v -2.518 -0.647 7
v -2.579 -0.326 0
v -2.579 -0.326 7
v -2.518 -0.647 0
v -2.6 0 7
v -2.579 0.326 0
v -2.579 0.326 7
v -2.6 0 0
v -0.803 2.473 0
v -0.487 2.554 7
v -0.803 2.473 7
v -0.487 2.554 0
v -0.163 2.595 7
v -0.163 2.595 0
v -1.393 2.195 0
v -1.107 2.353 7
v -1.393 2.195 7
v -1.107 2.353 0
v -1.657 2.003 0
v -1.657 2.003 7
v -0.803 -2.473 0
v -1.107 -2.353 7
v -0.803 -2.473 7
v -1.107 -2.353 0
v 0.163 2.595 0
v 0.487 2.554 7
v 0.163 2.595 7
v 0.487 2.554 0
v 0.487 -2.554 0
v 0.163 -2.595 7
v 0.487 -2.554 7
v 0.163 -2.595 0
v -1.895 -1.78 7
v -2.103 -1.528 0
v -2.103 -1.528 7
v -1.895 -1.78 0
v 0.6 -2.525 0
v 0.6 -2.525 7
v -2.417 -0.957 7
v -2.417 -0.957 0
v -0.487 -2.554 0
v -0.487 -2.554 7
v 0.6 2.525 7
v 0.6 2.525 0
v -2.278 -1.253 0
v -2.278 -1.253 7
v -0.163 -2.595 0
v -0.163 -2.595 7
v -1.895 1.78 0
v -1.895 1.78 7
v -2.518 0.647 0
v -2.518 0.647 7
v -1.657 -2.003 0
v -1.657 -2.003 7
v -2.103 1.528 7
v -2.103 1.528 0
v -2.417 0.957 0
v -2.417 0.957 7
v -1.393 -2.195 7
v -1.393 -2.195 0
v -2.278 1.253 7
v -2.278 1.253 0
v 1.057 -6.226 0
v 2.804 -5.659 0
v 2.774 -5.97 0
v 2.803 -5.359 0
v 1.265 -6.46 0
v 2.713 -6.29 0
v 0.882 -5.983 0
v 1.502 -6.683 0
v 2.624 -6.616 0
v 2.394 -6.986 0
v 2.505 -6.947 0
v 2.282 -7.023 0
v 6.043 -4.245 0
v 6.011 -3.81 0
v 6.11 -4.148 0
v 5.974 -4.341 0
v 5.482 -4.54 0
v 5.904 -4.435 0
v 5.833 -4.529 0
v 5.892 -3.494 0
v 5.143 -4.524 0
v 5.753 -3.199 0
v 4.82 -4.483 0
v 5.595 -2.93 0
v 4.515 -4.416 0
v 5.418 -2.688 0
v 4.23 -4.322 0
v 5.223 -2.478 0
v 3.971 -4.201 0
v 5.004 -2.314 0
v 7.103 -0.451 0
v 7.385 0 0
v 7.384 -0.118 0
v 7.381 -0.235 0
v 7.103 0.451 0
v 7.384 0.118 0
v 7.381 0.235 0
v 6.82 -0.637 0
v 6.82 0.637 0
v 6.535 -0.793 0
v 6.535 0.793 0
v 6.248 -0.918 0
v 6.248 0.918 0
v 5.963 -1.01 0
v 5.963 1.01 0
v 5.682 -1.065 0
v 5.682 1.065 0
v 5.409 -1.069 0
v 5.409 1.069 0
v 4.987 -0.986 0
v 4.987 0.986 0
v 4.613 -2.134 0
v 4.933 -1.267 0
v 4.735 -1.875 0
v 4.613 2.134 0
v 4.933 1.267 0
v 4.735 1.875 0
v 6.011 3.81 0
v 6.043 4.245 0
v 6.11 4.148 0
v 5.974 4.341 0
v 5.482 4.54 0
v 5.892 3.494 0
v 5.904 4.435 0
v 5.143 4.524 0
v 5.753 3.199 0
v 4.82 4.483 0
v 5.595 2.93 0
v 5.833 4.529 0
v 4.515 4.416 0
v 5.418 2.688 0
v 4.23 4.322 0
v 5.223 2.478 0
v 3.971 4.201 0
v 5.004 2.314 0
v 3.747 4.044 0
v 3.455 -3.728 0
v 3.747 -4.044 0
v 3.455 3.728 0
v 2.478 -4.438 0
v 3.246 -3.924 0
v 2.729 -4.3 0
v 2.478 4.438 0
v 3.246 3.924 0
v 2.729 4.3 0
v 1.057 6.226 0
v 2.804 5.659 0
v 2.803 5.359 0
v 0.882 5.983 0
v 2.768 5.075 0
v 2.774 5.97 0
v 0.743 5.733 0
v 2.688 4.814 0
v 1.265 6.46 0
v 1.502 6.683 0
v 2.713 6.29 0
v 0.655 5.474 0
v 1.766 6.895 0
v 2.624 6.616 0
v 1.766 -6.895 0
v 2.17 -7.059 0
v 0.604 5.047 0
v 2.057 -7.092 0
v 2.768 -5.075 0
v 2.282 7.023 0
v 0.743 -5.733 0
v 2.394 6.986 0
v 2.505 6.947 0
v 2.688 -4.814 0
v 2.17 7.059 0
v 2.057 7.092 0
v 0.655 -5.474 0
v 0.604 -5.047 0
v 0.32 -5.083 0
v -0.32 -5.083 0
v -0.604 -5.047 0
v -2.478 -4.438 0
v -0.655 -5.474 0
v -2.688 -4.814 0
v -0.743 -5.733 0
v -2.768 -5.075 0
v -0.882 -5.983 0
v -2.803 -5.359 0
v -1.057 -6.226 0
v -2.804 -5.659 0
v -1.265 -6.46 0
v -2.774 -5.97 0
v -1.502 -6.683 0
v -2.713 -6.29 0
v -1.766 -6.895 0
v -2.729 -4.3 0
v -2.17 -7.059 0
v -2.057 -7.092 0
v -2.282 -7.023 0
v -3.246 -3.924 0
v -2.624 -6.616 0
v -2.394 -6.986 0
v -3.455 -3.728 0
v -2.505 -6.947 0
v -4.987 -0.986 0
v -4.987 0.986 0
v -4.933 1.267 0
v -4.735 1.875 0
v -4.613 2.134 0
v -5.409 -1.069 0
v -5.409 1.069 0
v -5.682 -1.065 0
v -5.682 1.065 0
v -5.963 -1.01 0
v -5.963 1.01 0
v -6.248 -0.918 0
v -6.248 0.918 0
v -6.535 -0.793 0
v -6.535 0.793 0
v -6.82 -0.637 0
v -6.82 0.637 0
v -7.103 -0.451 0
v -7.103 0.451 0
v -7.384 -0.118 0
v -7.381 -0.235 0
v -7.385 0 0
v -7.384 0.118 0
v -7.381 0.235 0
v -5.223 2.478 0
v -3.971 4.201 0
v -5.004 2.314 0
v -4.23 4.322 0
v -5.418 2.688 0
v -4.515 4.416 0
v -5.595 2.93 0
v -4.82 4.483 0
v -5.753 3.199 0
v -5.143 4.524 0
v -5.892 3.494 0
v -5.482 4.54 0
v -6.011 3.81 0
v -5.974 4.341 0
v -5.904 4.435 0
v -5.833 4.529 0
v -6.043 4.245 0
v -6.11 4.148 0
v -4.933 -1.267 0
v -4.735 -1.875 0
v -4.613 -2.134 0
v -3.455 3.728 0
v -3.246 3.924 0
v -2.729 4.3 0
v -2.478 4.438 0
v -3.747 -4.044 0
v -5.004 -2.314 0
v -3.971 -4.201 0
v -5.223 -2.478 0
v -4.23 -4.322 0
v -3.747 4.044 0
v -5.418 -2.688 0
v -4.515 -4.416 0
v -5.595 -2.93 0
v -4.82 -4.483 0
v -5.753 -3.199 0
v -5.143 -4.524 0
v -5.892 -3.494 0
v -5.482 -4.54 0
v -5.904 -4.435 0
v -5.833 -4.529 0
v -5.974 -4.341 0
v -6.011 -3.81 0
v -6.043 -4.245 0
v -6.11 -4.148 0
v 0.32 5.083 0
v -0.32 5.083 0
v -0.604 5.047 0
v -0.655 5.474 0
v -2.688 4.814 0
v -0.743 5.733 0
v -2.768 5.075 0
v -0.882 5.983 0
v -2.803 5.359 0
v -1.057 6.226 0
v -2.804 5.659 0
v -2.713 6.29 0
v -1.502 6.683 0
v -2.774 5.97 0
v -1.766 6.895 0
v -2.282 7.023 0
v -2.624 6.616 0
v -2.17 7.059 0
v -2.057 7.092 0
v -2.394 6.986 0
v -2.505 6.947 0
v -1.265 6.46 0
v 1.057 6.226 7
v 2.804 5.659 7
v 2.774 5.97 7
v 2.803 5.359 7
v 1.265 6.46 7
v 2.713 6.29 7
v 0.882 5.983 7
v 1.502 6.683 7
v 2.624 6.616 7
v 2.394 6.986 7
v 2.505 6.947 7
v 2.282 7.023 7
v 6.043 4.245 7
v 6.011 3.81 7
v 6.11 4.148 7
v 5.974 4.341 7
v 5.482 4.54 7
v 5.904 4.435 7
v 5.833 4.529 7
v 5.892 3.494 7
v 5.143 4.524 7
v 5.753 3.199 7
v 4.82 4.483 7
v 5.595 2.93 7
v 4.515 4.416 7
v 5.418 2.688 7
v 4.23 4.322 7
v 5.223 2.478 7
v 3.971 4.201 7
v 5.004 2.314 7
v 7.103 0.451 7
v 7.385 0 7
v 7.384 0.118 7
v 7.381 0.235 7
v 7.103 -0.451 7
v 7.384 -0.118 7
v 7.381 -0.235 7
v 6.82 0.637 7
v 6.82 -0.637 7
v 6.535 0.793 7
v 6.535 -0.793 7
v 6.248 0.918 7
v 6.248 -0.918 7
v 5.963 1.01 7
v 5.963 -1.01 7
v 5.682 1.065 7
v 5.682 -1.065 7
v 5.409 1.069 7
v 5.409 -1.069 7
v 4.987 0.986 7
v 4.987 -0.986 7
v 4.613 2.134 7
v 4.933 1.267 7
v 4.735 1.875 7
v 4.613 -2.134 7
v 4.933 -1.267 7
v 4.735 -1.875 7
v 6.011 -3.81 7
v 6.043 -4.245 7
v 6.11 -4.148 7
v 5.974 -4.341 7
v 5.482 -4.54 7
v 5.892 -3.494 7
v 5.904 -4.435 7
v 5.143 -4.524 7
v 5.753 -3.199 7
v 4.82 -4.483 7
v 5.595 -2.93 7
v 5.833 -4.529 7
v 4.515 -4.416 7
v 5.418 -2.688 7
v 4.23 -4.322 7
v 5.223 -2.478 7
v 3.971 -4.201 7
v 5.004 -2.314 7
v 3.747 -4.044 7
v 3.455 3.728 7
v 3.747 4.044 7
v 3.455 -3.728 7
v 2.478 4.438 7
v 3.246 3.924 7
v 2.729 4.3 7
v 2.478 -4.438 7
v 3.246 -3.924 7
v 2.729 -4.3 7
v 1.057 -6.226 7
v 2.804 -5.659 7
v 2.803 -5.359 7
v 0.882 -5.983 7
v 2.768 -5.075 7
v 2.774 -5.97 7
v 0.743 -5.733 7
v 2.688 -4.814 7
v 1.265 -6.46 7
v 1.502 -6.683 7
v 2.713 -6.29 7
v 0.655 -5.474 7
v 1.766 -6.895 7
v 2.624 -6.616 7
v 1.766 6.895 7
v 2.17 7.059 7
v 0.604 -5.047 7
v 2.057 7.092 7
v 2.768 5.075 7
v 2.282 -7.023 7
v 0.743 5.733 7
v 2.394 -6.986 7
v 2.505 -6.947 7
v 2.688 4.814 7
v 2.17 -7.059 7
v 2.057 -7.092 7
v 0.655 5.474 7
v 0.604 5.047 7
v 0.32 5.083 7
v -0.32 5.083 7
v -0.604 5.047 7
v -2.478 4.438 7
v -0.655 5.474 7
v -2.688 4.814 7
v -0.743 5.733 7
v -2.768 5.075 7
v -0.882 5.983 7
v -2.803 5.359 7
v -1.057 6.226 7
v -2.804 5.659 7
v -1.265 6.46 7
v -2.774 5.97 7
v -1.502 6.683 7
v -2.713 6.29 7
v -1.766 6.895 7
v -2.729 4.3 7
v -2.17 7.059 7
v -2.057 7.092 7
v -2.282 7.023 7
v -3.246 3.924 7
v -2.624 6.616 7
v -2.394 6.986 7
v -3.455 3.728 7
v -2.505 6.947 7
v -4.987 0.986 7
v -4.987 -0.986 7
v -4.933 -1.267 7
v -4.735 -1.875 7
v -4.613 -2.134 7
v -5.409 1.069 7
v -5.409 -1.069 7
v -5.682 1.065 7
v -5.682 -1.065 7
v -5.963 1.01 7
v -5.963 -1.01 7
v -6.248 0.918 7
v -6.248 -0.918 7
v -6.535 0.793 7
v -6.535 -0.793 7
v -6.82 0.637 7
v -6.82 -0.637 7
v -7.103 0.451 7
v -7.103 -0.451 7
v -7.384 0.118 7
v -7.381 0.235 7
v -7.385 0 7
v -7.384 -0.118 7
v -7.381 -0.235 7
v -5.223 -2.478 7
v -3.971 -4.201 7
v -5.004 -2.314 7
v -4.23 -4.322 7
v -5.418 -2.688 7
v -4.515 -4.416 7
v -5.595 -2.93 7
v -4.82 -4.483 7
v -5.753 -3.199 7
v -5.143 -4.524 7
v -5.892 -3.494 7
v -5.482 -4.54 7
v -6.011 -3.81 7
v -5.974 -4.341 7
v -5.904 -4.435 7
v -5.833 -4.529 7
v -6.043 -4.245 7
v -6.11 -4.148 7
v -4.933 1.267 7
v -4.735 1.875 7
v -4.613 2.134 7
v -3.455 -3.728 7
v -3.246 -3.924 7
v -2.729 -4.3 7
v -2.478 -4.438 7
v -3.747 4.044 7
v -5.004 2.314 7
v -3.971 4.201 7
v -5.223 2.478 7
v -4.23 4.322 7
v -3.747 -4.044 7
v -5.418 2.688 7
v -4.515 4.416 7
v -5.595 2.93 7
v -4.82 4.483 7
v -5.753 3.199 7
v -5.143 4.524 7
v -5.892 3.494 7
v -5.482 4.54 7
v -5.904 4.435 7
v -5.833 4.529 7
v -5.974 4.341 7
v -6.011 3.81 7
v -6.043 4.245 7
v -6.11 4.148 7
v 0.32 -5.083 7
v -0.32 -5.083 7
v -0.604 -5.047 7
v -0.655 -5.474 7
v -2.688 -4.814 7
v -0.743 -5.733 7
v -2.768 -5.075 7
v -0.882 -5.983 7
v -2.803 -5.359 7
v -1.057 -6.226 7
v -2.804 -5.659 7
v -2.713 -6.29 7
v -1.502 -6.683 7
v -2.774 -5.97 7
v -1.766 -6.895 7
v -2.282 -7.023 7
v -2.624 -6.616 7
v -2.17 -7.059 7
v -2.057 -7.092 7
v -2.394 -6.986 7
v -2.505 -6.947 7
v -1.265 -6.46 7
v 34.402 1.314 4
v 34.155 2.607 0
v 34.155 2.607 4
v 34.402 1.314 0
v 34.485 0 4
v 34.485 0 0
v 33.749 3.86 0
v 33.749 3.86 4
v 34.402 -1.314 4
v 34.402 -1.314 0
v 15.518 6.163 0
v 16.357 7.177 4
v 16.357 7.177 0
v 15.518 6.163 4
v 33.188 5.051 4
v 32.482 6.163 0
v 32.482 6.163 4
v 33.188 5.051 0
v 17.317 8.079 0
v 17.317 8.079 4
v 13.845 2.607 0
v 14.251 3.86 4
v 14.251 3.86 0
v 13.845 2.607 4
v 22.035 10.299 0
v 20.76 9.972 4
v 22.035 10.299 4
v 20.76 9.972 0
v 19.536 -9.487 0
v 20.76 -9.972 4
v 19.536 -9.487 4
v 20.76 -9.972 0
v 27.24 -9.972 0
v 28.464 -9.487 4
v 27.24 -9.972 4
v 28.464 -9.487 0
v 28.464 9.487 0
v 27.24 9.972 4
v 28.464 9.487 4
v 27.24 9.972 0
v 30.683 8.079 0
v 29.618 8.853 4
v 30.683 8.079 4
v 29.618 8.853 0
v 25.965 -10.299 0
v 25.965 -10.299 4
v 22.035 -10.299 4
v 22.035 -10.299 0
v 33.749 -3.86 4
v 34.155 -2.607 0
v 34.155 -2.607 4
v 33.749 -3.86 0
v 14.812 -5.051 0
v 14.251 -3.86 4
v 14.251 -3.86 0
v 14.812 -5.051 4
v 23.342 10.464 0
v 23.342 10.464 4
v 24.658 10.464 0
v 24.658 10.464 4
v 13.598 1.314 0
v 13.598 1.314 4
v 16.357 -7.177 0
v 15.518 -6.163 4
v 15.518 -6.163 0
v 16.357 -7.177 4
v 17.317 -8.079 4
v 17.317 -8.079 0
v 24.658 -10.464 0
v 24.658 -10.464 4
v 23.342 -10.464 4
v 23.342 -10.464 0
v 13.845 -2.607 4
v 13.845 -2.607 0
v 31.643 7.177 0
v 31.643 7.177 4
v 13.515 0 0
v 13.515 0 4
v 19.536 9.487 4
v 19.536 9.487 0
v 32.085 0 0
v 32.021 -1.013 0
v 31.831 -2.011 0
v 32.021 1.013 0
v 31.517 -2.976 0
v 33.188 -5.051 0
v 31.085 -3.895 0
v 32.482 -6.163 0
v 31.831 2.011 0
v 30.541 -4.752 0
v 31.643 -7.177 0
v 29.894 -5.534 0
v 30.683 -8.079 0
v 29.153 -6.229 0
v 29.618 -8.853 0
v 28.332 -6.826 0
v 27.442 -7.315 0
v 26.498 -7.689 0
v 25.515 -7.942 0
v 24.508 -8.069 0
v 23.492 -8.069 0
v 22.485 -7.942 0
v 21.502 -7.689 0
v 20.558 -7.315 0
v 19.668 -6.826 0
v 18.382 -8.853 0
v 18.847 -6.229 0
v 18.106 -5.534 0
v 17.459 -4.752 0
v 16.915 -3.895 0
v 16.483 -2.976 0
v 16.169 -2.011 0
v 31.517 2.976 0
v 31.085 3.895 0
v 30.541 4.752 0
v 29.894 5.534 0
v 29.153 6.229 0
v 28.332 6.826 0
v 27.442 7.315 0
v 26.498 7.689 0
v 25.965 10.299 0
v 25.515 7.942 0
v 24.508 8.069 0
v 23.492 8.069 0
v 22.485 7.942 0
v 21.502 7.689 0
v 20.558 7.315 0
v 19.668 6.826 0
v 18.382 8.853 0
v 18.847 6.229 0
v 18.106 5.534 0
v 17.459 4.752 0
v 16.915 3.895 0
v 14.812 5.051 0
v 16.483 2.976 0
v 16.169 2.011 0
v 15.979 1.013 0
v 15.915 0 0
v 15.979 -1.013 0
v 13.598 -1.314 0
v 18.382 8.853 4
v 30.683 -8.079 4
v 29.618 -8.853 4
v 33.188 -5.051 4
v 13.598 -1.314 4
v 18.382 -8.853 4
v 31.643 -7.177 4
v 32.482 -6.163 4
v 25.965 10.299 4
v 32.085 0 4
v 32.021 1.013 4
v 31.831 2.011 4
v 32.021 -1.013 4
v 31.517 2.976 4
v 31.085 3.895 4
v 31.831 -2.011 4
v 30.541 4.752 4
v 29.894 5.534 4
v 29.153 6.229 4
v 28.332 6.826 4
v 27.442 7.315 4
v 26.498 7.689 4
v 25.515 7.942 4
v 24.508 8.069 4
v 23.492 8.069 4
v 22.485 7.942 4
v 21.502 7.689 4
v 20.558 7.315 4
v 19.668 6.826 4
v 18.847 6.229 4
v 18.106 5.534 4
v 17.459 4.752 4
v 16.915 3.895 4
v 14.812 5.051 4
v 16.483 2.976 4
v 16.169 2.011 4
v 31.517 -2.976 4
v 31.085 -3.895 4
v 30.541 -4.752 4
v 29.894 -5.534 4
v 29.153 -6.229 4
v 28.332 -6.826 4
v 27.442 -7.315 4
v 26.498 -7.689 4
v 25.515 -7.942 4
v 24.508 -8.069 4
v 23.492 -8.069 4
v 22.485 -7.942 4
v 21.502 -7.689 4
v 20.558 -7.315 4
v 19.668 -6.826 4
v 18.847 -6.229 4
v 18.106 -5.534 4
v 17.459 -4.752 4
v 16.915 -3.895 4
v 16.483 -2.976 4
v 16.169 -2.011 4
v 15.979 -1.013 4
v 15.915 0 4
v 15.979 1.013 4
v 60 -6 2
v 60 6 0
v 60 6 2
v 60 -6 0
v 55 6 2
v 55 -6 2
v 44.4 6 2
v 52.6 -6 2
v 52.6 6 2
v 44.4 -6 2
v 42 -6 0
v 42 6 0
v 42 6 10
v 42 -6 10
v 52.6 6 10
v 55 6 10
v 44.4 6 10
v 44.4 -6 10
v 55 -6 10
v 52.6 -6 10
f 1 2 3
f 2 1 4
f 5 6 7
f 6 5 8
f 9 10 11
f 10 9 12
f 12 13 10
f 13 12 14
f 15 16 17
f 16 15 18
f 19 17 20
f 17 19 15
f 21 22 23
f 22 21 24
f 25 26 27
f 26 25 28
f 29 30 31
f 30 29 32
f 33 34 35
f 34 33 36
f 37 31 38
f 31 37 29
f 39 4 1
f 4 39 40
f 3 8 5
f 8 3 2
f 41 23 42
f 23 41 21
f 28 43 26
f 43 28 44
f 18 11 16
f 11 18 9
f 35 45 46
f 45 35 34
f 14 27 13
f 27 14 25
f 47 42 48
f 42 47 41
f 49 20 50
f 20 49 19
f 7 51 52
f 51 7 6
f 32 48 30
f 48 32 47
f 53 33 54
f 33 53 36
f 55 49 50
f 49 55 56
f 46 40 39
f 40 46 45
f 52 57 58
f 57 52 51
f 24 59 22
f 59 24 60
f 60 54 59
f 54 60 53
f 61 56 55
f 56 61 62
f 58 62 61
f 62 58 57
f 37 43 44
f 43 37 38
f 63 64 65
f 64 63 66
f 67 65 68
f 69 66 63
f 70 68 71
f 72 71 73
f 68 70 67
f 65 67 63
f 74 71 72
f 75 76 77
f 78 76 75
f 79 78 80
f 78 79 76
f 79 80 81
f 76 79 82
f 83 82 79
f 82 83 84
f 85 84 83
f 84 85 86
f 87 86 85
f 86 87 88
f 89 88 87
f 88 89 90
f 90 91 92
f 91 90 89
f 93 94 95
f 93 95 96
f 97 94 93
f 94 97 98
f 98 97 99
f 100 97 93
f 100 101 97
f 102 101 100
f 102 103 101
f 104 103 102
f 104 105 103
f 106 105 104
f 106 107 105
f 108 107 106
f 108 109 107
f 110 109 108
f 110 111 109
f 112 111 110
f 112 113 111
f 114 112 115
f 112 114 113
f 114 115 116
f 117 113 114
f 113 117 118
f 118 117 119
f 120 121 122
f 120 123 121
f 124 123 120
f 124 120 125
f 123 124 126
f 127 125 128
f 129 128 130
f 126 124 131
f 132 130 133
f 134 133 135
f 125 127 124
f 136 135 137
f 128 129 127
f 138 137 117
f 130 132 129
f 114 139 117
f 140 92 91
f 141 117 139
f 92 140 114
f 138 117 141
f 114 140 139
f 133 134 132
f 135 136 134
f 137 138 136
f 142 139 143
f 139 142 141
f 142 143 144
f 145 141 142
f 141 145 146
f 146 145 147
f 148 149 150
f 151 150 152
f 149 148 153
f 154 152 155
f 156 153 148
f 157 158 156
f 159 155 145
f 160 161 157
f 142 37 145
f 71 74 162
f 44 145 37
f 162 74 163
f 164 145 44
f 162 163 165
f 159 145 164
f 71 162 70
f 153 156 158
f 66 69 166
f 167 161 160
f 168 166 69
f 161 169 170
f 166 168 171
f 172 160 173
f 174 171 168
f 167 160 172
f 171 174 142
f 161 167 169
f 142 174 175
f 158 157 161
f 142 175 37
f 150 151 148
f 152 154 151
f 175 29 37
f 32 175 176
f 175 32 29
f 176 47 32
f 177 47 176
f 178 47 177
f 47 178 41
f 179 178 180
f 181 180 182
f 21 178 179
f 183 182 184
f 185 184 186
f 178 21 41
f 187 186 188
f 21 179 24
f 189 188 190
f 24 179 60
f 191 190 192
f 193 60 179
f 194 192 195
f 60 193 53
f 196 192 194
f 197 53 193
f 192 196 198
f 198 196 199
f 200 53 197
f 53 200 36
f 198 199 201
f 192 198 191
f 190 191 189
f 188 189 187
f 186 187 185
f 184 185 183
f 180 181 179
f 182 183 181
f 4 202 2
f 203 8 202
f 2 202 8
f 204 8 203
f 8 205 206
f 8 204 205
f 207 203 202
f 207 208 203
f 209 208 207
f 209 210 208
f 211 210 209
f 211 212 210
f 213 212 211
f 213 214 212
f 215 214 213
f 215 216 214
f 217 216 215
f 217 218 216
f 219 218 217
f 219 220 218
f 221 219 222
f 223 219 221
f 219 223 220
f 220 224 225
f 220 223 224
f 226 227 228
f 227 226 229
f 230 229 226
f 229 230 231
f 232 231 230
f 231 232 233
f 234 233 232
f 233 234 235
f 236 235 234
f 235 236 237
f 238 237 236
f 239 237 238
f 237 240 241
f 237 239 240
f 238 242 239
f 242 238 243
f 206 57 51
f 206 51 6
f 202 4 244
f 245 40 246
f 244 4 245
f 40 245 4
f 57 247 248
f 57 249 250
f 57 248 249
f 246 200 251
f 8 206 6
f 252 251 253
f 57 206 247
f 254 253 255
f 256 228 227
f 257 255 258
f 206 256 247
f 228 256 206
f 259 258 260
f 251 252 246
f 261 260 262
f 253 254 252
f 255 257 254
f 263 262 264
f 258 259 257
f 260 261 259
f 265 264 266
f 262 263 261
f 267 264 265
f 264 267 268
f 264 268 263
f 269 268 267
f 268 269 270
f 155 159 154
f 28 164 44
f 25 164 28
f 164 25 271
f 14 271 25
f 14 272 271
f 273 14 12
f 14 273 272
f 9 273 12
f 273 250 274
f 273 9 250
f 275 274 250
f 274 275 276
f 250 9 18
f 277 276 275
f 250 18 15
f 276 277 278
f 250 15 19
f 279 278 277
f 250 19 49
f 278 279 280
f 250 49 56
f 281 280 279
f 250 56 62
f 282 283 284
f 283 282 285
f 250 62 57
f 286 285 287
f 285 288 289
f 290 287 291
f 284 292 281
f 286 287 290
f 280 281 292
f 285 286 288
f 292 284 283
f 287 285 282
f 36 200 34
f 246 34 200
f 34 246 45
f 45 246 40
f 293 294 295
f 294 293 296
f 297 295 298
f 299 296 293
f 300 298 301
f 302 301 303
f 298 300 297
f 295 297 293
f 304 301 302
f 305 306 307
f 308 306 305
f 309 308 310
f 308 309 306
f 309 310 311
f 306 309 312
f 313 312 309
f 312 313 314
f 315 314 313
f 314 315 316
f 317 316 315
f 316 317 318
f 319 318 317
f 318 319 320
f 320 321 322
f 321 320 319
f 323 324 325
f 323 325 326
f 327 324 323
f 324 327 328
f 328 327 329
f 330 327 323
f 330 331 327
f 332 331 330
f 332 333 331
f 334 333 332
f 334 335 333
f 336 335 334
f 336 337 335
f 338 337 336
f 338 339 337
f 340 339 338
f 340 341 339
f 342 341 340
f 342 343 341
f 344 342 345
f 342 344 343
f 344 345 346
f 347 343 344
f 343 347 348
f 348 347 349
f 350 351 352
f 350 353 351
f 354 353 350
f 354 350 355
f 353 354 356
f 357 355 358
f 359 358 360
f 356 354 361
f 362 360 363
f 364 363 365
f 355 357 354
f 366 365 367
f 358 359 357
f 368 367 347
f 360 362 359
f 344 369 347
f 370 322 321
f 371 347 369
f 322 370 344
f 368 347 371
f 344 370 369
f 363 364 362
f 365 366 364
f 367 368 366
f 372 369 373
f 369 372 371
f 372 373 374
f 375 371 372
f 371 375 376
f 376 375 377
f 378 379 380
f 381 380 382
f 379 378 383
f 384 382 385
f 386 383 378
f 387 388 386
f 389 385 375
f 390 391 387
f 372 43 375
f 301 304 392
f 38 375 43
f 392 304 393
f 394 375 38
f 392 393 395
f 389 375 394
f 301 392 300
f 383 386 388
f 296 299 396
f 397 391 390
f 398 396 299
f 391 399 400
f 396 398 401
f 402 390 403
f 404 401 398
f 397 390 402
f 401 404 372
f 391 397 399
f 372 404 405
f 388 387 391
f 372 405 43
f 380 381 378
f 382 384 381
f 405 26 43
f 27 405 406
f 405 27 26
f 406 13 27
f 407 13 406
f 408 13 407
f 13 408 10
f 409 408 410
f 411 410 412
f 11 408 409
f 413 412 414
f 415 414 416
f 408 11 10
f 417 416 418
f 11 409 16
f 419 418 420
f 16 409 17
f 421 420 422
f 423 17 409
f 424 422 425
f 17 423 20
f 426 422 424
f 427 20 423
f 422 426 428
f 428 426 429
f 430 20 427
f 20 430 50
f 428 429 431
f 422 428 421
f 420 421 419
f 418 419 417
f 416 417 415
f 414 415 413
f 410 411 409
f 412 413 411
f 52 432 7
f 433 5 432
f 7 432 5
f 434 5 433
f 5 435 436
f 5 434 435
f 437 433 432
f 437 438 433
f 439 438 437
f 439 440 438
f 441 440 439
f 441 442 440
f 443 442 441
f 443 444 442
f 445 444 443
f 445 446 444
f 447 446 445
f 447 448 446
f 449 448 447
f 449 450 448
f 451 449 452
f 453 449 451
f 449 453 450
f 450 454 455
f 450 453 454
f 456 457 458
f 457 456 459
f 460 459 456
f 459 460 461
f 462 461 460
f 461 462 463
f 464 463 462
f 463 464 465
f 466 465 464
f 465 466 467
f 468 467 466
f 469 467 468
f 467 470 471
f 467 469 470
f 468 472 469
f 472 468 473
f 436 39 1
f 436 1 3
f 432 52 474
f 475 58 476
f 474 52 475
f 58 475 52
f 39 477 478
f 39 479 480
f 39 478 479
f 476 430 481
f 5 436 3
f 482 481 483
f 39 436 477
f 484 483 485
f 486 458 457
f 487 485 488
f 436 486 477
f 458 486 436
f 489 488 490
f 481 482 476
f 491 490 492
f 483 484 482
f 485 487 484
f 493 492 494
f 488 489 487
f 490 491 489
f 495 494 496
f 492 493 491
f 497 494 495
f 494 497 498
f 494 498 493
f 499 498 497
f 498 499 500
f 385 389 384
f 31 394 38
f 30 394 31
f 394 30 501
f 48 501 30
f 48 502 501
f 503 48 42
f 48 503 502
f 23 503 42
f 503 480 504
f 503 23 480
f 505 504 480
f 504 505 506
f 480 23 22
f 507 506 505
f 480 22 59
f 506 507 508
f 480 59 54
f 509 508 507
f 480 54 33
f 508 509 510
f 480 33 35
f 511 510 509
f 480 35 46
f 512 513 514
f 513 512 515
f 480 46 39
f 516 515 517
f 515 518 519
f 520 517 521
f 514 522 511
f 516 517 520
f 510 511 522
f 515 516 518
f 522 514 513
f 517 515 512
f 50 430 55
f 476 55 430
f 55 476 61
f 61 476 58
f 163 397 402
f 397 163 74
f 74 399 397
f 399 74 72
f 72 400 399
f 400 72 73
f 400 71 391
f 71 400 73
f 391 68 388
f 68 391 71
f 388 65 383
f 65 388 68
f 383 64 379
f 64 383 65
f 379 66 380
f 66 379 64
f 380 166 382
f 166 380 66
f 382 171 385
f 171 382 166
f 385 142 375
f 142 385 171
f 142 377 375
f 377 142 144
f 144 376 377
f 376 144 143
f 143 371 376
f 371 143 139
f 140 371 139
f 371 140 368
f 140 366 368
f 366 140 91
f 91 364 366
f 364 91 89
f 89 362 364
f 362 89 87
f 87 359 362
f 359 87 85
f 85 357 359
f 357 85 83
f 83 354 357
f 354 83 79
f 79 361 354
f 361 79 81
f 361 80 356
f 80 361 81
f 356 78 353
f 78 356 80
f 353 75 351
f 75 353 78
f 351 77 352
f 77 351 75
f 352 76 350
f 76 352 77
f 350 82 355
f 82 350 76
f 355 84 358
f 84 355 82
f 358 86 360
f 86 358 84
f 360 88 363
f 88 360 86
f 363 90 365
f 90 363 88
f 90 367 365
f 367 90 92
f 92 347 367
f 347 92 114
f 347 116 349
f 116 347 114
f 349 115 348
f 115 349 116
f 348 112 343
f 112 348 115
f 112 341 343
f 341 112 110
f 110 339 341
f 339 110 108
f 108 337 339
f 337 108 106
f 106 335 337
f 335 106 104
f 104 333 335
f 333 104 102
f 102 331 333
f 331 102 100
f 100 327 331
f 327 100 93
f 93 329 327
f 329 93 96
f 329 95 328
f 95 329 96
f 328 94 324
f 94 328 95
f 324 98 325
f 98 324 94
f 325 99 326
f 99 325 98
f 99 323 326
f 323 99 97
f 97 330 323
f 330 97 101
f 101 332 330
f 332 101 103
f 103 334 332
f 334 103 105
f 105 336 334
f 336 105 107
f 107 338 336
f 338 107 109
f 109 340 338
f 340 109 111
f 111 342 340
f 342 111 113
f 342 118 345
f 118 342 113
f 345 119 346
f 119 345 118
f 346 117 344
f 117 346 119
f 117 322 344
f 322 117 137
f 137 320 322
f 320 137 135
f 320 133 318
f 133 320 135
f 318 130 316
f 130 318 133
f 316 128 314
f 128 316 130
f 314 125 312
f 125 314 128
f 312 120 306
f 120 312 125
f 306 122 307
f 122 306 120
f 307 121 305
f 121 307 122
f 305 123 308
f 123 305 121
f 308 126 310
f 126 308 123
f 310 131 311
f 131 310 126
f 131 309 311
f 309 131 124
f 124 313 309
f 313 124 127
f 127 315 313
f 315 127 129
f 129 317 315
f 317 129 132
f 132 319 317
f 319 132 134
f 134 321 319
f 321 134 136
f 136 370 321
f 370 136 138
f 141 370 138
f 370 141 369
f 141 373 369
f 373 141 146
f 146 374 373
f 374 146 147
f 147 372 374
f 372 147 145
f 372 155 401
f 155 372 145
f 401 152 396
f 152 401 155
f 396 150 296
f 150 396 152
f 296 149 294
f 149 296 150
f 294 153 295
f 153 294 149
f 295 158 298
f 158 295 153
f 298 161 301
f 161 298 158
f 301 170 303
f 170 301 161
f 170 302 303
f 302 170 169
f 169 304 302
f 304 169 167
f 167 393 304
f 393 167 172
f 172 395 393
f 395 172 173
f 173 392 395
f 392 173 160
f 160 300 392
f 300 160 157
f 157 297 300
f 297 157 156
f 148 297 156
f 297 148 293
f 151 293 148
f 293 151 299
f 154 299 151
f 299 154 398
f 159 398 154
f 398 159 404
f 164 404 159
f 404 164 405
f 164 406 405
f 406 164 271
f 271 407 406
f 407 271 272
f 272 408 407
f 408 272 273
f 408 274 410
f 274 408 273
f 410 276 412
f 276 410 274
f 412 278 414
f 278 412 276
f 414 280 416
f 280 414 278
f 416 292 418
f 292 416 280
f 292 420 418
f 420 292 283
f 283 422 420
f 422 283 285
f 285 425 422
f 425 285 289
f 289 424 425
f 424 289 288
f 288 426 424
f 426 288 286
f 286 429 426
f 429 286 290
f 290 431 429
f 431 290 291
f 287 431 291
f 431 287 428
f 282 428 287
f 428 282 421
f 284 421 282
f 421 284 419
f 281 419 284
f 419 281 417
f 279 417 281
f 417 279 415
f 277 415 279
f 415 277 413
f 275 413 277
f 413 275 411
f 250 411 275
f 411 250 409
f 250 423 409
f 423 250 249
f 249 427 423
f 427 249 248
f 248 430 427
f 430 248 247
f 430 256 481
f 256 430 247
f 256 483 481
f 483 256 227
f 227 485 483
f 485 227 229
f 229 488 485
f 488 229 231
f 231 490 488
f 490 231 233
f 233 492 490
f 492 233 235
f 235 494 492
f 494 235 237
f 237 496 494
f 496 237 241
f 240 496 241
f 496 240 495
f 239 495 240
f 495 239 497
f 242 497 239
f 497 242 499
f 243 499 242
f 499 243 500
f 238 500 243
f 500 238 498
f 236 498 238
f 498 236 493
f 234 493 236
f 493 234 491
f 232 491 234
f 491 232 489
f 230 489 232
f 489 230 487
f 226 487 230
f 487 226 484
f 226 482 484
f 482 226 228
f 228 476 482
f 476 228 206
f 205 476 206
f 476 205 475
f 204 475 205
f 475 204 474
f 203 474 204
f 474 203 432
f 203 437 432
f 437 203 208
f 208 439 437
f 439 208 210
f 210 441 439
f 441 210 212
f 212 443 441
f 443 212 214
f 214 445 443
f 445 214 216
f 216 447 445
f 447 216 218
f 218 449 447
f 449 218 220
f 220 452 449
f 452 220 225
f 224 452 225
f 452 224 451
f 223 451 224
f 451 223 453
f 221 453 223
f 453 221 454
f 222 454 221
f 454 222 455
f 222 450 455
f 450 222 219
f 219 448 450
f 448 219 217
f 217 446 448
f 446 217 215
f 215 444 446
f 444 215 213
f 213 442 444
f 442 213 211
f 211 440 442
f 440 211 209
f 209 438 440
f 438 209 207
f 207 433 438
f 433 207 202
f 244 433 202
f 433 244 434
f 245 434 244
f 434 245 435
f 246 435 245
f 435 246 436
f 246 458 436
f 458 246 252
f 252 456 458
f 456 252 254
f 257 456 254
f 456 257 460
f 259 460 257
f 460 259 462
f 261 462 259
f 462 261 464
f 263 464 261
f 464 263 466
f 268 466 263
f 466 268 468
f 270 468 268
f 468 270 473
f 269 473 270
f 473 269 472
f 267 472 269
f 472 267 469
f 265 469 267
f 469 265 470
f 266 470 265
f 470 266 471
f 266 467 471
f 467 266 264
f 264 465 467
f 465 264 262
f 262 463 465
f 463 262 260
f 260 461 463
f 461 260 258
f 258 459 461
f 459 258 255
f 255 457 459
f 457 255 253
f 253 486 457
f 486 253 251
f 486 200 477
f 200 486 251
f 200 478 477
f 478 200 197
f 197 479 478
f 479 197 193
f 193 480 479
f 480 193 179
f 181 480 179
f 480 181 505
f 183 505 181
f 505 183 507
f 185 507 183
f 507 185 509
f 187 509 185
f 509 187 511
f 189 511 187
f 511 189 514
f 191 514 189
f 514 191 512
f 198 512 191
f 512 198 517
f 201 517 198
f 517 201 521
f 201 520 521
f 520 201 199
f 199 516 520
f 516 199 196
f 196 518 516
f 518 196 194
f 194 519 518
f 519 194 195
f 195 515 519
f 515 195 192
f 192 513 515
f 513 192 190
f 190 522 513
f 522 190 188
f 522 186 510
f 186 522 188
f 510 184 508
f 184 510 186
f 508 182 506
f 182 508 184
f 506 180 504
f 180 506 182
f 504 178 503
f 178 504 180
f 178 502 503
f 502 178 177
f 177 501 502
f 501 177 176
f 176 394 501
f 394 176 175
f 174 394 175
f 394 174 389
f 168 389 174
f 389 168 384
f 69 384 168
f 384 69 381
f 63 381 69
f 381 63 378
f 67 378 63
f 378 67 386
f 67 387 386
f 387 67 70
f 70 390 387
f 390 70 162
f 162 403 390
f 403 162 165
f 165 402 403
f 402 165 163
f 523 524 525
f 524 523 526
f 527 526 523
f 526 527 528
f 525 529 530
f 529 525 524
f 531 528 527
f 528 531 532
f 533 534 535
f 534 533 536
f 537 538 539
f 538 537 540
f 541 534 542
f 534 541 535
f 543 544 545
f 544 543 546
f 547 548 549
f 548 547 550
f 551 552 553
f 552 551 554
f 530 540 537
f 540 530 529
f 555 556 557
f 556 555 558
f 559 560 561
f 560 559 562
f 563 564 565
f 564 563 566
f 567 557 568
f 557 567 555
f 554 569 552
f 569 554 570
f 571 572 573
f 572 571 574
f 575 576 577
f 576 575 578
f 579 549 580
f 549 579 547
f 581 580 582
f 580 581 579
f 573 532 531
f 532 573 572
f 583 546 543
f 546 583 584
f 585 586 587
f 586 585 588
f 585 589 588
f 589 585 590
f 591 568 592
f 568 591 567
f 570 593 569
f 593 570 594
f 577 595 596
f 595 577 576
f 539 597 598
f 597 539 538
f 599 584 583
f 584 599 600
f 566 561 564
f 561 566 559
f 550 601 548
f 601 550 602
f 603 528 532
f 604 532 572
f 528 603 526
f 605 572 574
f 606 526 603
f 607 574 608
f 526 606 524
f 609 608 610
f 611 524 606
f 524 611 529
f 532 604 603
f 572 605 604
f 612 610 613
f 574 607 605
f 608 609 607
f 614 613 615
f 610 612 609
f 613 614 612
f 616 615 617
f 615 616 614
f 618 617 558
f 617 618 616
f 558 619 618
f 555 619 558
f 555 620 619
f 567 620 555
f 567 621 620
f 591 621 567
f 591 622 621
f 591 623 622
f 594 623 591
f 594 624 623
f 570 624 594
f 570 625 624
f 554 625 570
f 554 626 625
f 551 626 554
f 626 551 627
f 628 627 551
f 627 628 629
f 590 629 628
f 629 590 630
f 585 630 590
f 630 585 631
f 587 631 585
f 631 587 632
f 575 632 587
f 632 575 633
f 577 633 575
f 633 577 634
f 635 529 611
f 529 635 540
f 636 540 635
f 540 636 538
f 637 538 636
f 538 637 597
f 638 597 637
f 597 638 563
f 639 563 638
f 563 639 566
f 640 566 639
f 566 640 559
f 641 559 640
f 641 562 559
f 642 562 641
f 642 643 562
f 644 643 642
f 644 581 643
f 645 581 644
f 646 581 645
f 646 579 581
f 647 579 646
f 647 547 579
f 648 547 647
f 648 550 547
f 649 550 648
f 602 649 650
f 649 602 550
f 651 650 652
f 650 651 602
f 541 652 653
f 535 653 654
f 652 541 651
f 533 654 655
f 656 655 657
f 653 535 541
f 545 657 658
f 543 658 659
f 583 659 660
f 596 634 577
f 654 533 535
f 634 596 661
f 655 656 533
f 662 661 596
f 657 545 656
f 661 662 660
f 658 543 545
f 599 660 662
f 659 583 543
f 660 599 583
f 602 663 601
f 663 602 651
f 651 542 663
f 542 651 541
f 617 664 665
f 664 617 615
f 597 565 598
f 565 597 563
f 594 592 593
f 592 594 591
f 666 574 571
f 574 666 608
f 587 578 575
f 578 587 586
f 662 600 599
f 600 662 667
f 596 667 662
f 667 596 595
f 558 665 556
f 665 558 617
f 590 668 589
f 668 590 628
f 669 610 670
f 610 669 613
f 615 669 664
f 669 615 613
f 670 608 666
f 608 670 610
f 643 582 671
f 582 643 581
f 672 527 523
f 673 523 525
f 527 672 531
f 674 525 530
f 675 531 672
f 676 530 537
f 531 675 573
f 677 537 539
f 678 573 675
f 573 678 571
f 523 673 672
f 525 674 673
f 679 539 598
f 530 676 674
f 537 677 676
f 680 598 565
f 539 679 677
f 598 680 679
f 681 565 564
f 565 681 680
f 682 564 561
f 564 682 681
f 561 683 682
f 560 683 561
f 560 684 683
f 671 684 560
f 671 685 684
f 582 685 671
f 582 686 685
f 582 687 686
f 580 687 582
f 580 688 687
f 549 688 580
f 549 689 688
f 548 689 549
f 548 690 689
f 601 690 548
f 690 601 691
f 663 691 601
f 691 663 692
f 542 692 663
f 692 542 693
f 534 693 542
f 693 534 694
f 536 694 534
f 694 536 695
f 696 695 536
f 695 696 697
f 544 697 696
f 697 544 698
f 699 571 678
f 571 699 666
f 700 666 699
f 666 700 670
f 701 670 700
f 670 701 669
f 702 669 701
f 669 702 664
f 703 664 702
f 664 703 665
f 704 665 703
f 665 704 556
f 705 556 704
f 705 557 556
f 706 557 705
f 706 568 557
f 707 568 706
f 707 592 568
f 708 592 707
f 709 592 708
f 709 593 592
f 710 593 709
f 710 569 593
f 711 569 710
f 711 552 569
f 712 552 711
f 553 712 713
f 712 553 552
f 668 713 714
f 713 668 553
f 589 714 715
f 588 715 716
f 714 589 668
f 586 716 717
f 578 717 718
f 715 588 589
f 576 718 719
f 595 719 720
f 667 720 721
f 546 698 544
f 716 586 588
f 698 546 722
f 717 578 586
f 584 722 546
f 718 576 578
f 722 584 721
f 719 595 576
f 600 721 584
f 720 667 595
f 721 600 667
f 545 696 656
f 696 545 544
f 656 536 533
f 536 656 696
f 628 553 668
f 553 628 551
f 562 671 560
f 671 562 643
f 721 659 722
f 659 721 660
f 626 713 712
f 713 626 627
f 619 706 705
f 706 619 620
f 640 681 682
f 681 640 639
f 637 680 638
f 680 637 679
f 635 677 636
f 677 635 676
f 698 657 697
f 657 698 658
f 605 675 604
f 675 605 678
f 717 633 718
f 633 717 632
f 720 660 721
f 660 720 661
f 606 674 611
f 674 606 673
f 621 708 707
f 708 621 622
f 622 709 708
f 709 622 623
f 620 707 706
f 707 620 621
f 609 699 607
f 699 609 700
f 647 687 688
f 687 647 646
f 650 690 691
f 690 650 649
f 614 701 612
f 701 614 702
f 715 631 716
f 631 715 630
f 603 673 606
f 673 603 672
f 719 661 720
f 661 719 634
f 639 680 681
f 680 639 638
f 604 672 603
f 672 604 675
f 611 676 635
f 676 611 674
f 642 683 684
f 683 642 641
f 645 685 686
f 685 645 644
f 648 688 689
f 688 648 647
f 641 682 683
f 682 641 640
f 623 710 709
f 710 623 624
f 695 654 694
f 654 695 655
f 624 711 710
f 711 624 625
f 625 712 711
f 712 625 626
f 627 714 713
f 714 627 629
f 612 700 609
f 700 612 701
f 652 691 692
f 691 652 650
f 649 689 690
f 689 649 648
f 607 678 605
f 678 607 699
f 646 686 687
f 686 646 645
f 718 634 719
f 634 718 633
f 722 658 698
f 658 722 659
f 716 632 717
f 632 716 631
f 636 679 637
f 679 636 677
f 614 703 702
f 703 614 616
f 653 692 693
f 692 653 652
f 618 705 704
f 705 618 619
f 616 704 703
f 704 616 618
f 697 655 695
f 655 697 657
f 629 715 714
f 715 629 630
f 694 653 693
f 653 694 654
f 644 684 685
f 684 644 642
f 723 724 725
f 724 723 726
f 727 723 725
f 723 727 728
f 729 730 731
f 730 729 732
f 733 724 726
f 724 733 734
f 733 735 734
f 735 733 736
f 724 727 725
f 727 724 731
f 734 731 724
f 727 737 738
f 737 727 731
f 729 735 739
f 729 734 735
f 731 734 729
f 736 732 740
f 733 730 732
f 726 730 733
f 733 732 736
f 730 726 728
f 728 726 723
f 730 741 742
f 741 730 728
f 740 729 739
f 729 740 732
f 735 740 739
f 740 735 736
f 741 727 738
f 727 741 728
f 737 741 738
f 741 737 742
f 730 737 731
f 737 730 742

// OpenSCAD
/*
  Cupom pequeno para validar a folga real do pinhao antes dos carrinhos.

  Imprime tres componentes:
    1. um pinhao real;
    2. um anel que valida a folga radial do bolso;
    3. um garfo que valida a folga axial entre as paredes.

  O pinhao deve entrar e girar no anel sem raspar. Tambem deve passar entre
  as paredes do garfo sem precisar ser forcado.
*/

include <00_Parametros.scad>;

coupon_wall = 2.4;
radial_h = 4.0;
axial_gap = pinion_thickness + 2*pinion_pocket_axial_clearance;

module radial_clearance_coupon() {
  difference() {
    cylinder(r=gear_outer_radius+pinion_pocket_radial_clearance+coupon_wall,
             h=radial_h);
    translate([0,0,-EPS])
      cylinder(r=gear_outer_radius+pinion_pocket_radial_clearance,
               h=radial_h+2*EPS);
  }
}

module axial_clearance_coupon() {
  base_w = 18;
  base_d = 12;
  wall_h = 10;
  wall_t = 2.4;

  union() {
    cube([base_w,base_d,2]);
    cube([wall_t,base_d,wall_h]);
    translate([wall_t+axial_gap,0,0]) cube([wall_t,base_d,wall_h]);
  }
}

pinion_gear();
translate([24,0,0]) radial_clearance_coupon();
translate([42,-6,0]) axial_clearance_coupon();

echo("Folga radial do bolso por lado:",pinion_pocket_radial_clearance,"mm");
echo("Folga axial do bolso por lado:",pinion_pocket_axial_clearance,"mm");
